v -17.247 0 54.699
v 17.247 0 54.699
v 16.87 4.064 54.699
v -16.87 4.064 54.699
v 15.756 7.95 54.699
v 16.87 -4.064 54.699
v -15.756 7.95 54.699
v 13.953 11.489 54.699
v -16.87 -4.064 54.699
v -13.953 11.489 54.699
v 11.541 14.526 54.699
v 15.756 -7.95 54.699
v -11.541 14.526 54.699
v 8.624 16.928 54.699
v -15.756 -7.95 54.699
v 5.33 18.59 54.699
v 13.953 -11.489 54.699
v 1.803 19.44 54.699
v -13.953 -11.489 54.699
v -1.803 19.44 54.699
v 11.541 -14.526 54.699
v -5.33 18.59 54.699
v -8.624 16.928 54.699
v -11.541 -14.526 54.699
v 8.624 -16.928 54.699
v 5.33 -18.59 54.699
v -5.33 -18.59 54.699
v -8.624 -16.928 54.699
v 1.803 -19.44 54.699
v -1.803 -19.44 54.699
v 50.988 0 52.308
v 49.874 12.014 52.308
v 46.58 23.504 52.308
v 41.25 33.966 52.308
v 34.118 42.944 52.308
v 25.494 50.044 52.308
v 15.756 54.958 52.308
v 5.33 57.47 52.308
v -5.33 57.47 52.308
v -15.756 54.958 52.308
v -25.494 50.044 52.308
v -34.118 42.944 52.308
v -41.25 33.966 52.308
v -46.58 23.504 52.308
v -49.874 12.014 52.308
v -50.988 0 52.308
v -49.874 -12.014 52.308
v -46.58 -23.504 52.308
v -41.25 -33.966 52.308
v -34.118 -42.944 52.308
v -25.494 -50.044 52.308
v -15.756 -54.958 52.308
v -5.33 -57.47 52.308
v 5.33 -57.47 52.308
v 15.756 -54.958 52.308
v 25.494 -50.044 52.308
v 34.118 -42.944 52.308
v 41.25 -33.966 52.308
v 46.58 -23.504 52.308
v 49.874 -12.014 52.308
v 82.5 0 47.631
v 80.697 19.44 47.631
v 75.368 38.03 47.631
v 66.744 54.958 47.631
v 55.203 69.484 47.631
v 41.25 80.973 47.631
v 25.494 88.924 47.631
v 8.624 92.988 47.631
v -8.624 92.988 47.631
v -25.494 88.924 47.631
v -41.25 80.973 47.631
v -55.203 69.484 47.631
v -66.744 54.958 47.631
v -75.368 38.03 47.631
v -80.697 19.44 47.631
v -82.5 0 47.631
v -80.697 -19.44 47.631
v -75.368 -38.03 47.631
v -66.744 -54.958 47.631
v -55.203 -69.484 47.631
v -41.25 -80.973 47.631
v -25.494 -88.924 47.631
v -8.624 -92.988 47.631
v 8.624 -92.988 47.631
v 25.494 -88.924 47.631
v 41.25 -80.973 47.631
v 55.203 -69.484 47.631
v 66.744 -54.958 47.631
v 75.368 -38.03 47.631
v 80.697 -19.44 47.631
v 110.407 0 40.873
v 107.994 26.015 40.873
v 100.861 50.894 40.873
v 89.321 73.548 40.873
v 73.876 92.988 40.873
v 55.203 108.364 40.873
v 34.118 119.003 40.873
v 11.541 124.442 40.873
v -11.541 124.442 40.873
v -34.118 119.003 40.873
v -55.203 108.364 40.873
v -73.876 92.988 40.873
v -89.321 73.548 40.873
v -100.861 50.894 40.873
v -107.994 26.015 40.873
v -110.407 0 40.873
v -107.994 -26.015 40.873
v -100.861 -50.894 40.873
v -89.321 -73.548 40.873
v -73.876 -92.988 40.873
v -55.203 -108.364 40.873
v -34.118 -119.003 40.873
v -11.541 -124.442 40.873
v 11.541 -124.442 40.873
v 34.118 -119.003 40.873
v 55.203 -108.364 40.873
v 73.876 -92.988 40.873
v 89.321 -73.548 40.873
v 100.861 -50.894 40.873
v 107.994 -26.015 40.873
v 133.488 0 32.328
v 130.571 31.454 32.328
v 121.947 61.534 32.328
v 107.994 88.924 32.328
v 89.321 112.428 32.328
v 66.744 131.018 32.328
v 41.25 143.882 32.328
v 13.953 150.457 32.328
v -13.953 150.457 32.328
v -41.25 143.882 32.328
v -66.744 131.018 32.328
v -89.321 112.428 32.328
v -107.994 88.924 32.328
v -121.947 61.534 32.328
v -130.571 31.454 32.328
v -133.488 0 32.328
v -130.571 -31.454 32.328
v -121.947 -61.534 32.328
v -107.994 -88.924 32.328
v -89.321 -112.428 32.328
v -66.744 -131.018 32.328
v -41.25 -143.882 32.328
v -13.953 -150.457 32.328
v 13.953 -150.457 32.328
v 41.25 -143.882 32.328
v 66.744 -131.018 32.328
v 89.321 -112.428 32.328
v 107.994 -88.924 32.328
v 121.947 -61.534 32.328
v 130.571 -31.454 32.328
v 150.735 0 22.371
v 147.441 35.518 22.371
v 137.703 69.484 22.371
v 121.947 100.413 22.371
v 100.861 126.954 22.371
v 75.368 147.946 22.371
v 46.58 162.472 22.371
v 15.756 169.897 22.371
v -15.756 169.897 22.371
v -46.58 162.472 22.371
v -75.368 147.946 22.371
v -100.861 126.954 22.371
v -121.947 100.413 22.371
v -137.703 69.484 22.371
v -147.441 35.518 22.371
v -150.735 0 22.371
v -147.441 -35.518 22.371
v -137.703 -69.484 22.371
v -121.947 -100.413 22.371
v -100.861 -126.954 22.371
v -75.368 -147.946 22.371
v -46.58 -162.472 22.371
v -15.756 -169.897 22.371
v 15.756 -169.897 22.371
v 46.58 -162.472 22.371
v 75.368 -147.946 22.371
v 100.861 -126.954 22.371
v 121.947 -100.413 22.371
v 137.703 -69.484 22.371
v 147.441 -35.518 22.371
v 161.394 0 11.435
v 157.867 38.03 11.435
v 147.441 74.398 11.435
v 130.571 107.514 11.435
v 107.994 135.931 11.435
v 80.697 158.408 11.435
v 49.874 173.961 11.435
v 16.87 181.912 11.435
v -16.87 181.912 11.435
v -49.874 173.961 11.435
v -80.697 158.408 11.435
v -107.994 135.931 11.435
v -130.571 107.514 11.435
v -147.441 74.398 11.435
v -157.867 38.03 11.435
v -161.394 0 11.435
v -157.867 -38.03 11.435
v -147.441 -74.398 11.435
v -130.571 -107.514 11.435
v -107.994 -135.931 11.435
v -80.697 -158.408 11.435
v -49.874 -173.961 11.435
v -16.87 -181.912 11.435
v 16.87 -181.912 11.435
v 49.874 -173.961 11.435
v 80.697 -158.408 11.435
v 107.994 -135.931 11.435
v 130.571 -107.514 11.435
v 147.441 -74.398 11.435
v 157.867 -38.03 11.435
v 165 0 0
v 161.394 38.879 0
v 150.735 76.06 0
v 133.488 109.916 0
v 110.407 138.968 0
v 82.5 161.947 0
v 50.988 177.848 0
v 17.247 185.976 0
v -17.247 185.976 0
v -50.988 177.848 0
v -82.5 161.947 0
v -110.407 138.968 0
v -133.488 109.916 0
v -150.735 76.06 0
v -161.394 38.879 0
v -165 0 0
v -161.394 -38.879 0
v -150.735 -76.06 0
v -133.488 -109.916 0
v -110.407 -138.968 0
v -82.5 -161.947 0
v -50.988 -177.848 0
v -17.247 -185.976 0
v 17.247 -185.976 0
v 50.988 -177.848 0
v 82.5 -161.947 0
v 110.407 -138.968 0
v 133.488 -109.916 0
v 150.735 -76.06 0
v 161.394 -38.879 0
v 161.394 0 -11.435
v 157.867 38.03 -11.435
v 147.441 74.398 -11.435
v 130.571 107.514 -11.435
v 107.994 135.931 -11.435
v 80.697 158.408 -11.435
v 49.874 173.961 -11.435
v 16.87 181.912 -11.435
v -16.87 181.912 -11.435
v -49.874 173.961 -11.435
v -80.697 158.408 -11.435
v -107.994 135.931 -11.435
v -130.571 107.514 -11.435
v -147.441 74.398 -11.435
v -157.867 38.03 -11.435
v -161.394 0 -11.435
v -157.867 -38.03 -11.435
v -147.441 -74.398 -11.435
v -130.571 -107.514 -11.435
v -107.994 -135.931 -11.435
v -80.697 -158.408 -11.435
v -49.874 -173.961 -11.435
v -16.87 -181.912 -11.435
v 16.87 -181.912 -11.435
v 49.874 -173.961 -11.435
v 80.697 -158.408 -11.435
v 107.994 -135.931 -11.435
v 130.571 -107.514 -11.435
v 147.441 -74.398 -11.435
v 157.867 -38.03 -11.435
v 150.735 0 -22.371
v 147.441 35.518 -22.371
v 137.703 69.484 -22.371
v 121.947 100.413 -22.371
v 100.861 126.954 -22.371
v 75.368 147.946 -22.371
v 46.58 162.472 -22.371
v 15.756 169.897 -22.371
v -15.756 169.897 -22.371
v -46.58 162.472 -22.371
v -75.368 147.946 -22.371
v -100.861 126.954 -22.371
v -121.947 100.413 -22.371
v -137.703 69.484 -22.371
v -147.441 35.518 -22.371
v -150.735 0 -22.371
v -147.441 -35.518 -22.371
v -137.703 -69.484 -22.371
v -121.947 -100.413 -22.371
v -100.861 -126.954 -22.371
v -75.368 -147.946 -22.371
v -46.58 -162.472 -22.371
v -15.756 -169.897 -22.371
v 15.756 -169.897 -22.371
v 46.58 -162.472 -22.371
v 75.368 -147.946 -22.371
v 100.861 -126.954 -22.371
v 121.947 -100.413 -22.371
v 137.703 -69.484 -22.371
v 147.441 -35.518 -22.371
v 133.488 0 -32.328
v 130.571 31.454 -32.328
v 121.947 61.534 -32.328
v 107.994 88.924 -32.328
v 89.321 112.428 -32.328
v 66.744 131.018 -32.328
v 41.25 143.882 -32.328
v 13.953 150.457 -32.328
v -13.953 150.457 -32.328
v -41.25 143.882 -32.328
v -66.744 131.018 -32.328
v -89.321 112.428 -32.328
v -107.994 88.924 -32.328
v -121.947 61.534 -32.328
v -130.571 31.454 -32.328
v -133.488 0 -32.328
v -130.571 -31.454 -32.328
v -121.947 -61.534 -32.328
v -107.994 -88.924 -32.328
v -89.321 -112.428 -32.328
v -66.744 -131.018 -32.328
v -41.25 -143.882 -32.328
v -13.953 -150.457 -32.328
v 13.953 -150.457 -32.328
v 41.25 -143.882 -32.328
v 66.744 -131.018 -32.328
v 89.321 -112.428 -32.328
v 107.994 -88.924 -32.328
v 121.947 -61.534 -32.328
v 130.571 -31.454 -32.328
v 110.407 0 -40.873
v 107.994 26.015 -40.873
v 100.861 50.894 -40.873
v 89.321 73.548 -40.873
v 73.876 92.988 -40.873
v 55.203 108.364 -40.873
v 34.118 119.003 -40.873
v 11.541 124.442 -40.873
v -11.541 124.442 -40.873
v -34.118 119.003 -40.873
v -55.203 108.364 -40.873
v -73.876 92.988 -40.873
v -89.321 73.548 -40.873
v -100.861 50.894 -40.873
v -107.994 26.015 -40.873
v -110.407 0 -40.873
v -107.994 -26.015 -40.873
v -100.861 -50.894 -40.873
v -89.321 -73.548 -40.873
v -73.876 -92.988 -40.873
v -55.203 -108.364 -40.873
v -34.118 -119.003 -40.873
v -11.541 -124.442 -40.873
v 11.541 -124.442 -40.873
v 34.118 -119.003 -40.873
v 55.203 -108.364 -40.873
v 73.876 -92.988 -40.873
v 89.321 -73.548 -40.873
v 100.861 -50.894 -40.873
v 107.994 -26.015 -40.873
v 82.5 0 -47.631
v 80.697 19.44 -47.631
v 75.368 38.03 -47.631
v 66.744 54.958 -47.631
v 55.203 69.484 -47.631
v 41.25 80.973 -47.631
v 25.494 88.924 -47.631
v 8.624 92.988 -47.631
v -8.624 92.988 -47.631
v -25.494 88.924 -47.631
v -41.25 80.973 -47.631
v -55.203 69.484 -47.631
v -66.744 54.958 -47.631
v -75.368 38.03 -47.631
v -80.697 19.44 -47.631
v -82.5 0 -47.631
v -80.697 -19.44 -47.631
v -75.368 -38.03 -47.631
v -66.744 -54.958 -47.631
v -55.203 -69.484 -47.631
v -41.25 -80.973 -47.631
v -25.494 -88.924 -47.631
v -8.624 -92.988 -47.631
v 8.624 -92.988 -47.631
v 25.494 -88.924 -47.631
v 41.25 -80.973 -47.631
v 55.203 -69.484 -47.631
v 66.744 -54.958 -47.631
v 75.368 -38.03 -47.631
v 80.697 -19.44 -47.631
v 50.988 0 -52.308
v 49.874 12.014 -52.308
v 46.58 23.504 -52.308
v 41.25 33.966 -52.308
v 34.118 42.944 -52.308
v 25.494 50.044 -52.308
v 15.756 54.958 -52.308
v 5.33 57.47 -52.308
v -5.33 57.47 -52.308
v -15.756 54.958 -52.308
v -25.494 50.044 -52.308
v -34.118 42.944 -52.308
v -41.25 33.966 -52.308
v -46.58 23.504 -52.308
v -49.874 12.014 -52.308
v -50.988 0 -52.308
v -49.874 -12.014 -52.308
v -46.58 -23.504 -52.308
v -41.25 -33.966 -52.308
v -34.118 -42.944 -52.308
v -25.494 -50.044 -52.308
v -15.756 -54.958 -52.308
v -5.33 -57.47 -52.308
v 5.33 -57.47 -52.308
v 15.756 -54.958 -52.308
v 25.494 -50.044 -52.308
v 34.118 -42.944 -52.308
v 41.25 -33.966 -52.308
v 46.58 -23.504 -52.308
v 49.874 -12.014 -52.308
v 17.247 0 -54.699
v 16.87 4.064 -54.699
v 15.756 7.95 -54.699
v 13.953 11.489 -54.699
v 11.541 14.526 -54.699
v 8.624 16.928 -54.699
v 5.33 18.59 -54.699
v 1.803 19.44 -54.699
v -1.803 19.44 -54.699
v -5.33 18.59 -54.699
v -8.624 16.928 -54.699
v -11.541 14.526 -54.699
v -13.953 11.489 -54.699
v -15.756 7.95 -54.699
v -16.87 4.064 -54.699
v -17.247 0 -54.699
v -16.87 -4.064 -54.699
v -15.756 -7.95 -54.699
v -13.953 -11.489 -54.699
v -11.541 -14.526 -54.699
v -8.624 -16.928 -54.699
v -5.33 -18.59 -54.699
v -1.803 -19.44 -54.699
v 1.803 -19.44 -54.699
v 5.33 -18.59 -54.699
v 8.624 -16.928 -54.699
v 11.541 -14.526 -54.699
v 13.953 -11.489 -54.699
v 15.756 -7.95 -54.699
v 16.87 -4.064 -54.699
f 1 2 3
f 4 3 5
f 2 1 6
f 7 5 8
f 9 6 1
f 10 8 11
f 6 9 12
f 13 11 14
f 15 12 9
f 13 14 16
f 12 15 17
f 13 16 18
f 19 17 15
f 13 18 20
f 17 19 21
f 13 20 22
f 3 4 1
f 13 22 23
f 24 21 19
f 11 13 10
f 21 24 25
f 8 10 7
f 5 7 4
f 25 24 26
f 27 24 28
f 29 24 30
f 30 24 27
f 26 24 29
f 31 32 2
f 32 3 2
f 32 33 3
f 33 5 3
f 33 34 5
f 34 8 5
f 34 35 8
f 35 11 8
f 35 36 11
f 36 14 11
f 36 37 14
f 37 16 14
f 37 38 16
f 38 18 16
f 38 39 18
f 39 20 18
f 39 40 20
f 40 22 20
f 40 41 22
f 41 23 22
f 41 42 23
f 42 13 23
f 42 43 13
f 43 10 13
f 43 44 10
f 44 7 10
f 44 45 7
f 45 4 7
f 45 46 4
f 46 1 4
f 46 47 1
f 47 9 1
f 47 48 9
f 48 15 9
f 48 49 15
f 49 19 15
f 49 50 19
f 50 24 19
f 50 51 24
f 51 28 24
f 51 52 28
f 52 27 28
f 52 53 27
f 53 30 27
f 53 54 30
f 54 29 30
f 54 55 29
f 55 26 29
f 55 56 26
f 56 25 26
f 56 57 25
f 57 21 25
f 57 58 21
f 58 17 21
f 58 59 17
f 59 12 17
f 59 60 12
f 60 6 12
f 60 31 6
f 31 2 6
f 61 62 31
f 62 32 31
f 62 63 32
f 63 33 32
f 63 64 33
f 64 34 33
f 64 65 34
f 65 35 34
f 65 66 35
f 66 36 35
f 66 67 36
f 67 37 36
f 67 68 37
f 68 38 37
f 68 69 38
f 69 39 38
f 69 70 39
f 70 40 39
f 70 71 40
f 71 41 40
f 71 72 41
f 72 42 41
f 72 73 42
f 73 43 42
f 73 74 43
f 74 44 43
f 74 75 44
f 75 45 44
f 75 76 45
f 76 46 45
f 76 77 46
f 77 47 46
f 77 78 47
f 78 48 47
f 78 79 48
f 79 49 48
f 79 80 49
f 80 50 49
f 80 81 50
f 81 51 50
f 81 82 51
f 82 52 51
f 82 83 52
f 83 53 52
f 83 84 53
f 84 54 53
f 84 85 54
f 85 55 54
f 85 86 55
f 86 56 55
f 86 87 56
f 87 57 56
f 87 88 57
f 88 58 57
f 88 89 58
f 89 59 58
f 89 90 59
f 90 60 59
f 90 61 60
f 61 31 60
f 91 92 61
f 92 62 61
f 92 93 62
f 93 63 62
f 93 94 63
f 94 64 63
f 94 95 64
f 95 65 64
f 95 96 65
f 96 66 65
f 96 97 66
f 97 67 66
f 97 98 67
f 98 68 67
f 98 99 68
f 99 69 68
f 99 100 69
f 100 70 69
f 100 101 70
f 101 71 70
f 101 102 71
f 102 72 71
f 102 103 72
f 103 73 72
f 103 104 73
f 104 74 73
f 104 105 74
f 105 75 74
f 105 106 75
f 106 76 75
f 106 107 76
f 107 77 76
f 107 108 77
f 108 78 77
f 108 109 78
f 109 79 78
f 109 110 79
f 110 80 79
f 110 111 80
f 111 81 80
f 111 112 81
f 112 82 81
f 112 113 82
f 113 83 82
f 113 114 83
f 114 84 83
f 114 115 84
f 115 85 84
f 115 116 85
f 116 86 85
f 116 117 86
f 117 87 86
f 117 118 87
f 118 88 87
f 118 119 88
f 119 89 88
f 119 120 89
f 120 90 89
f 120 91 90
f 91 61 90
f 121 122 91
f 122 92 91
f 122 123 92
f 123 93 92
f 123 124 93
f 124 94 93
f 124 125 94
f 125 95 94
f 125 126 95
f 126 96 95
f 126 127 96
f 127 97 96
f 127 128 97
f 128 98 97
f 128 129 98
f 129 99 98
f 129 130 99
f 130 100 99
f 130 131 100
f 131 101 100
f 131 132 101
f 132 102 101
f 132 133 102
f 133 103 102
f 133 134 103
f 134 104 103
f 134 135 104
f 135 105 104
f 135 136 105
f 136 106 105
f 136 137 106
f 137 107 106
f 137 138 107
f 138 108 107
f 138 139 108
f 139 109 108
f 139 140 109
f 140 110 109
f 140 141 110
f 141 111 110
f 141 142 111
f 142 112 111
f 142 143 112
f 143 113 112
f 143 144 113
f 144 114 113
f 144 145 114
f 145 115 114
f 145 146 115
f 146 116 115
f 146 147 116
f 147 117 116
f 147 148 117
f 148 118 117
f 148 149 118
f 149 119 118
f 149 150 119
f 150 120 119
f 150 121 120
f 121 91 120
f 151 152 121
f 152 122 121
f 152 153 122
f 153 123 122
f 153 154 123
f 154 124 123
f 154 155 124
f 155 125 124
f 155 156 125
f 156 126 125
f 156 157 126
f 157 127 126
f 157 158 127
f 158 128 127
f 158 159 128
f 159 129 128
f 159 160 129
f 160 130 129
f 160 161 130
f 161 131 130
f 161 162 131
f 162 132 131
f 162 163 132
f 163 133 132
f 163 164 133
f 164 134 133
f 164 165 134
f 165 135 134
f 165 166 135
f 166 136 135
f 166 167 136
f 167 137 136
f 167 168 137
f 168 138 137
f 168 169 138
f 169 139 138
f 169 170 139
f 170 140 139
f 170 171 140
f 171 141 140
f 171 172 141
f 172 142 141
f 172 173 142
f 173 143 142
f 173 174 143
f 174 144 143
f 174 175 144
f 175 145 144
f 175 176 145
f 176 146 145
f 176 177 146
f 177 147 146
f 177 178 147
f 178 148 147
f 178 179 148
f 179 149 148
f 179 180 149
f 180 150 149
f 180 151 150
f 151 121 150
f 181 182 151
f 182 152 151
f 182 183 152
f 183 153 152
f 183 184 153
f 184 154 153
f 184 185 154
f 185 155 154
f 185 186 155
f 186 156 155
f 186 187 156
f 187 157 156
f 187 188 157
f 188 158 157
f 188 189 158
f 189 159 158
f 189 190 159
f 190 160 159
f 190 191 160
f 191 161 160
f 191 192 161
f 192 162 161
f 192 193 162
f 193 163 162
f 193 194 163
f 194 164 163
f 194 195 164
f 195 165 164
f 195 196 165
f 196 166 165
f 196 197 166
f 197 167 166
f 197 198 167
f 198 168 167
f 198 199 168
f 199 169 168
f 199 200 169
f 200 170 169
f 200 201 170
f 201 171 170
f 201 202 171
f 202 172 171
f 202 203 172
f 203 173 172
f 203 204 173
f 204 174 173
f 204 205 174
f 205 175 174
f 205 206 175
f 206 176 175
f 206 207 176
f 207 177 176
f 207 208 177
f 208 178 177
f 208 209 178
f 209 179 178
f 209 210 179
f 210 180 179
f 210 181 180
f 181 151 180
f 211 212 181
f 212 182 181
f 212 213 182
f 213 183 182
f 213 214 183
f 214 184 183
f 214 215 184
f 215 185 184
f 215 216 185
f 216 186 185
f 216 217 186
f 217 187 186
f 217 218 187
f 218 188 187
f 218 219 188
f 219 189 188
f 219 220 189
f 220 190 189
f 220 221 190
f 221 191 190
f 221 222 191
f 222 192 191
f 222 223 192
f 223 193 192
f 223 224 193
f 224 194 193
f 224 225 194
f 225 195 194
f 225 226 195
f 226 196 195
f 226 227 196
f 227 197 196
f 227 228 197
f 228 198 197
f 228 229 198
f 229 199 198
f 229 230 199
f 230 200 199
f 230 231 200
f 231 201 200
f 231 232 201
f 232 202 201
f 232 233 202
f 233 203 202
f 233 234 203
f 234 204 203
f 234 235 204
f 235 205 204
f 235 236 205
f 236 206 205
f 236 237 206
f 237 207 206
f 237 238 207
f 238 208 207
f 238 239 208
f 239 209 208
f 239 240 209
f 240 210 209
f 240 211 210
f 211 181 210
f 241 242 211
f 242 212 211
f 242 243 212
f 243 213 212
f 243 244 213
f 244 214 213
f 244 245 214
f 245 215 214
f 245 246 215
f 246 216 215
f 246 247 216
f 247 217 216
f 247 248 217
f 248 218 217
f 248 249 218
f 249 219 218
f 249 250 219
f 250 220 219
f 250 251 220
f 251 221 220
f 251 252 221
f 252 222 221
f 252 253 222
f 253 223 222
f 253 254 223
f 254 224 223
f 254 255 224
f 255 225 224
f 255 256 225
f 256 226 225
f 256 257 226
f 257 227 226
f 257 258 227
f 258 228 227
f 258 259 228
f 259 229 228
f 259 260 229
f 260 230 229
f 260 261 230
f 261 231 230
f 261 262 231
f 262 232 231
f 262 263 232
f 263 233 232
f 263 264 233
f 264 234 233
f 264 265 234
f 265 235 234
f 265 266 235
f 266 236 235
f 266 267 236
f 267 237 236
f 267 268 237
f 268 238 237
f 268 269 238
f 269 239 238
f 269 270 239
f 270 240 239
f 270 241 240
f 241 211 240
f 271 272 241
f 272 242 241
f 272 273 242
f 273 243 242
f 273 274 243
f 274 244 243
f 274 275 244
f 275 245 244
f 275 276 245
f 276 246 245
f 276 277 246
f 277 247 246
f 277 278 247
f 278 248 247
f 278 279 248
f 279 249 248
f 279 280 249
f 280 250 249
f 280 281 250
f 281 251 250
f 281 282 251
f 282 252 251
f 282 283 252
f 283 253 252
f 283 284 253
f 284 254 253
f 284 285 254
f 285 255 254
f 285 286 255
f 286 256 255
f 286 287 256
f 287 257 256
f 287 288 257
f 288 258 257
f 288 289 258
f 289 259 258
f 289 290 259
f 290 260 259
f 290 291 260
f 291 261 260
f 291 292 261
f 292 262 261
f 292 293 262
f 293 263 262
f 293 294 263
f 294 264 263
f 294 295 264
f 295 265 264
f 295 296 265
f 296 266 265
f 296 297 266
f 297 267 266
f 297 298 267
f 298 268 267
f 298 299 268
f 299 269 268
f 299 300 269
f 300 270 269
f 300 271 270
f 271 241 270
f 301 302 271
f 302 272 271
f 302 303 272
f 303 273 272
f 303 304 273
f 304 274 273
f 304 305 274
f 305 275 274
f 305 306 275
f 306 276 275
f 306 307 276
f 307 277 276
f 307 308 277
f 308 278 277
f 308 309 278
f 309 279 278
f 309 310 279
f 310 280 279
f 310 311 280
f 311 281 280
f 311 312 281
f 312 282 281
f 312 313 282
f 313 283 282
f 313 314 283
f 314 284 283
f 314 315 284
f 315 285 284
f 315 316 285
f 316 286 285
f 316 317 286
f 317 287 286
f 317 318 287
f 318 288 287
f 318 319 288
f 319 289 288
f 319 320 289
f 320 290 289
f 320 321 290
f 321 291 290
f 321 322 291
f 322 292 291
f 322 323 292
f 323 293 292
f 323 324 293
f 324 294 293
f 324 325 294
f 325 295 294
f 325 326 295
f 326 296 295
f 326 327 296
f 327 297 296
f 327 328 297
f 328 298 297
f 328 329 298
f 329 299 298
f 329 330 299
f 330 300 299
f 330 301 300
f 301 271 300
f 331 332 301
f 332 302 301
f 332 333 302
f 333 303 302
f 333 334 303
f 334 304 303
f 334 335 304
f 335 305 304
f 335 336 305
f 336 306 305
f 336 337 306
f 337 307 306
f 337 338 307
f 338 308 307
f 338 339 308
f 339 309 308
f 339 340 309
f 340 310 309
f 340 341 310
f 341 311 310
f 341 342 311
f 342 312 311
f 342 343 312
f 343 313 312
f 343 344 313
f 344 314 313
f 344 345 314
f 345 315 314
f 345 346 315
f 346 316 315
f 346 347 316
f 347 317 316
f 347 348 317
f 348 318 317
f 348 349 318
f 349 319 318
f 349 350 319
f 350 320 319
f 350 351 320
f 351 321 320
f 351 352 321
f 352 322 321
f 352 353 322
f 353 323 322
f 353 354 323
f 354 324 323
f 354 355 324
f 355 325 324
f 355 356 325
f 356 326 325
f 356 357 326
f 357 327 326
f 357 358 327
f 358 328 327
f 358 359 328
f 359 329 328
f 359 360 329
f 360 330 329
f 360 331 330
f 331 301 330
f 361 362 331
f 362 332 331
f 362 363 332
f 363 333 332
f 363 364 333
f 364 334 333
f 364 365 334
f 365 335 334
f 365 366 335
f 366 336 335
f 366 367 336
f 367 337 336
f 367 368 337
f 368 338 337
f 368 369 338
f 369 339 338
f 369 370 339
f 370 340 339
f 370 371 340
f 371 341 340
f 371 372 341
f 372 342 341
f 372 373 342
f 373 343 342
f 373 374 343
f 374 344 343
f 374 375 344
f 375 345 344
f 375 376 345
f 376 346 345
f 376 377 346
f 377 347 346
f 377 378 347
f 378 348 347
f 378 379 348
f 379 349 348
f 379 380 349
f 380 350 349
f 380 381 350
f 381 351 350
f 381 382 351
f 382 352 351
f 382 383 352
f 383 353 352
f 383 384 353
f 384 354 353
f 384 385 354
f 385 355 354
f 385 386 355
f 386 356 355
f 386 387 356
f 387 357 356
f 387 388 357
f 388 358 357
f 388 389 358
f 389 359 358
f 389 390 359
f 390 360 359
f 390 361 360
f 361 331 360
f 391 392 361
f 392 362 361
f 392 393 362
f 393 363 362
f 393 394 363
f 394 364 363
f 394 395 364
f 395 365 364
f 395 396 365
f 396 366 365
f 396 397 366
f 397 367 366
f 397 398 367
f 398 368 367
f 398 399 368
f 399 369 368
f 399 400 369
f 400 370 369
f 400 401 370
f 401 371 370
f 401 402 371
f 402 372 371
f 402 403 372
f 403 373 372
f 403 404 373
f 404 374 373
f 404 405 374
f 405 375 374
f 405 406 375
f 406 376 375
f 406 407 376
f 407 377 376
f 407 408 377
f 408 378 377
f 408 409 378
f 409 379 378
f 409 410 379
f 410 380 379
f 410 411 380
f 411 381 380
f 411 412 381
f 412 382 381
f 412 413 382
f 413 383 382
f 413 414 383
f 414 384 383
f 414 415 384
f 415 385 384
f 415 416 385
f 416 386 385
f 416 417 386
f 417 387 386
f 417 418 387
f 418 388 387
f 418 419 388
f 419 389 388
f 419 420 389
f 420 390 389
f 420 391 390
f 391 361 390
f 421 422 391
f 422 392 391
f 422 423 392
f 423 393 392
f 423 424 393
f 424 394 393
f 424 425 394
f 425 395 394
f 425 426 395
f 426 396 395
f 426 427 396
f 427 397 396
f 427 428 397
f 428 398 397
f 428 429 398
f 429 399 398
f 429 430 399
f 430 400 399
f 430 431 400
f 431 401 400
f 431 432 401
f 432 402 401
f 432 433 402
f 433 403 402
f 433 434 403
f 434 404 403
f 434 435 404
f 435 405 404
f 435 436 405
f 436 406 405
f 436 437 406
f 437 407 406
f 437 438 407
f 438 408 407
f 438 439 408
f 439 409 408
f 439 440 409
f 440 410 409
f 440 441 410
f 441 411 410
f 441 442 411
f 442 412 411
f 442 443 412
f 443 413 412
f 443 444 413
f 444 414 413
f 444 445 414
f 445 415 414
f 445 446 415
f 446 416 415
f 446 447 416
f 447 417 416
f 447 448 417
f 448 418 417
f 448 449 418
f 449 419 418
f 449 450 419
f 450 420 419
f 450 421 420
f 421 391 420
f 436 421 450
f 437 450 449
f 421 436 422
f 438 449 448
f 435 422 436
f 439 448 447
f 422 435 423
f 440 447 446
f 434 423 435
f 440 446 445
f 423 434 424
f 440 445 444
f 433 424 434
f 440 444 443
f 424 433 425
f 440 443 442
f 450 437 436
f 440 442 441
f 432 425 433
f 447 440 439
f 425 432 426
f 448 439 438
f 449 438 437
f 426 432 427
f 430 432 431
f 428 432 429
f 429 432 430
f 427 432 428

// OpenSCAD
// Generated by SolidPython 1.0.1 on 2020-07-29 00:46:52


scale(v = [15, 17, 5]) {
	sphere(r = 11);
}
/***********************************************
*********      SolidPython code:      **********
************************************************
 
# import packages: SolidPython
from solid import *
from solid.utils import *
from itertools import chain, combinations, permutations


class Resize:

    def __init__(self, scad_file):
        self.scad_file = scad_file
        #self.scad_file = import_scad(scad_file)
        # cone/cylinder param:
        self.r1 = 0
        self.r2 = 0
        self.h = 0
        # rectangular prism param:
        self.w = 0
        self.l = 0
        # ellipse param:
        self.r = 0

    # import OpenScad code (file name corresponds to shape)


    # classify shape + parameters
    def assign(self, param1, param2, param3):
        if self.scad_file == 'cone.scad':
            self.r1 = param1
            self.r2 = param2
            self.h = param3
        elif self.scad_file == 'cylinder.scad':
            self.r1 = param1
            self.r2 = param2
            self.h = param3
        elif self.scad_file == 'rectangularPrism.scad':
            self.h = param1
            self.l = param2
            self.w = param3
        else:
            self.r = param1
            self.h = param2

    # resize parameters
    def iterate(self):
        x = range(3, 20, 2)
        i = 1
        if self.scad_file == 'cone.scad':
            tempList = list(permutations(x, 2))
            for temp in tempList:
                param1 = temp[0]
                param2 = temp[1]
                filepath = 'produced_scad_files/' + 'cone' + str(param1) + '_' + str(param2) + '_' + '.scad'
                scad_render_to_file(cylinder(h=param1, r1=param2, r2=0), filepath)

        elif self.scad_file == 'cylinder.scad':
            tempList = list(permutations(x, 3))
            for temp in tempList:
                param1 = temp[0]
                param2 = temp[1]
                filepath = 'produced_scad_files/' + 'cylinder' + str(param1) + '_' + str(param2) + '_' + '.scad'
                scad_render_to_file(cylinder(h=param1, r1=param2, r2=param2), filepath)

        elif self.scad_file == 'rectangularPrism.scad':
            tempList = list(permutations(x, 3))
            for temp in tempList:
                param1 = temp[0]
                param2 = temp[1]
                param3 = temp[2]
                filepath = 'produced_scad_files/' + 'rectangularPrism' + str(param1) + '_' + str(param2) + '_' + str(
                    param3) + '.scad'
                scad_render_to_file(cube(size=(param1, param2, param3)), filepath)

        elif self.scad_file == 'ellipse.scad':
            tempList = list(permutations(x, 4))
            for temp in tempList:
                param1 = temp[0]
                param2 = temp[1]
                param3 = temp[2]
                param4 = temp[3]
                filepath = 'produced_scad_files/' + 'ellipse' + str(param1) + '_' + str(param2) + '_' + str(param3) + '_' + str(param4) + '.scad'
                scad_render_to_file(scale([param1, param2, param3])(sphere(r=param4)), filepath)

    def render_to_scadfile(self):
        scad_render_to_file(scad, 'example.scad') 
 
************************************************/
